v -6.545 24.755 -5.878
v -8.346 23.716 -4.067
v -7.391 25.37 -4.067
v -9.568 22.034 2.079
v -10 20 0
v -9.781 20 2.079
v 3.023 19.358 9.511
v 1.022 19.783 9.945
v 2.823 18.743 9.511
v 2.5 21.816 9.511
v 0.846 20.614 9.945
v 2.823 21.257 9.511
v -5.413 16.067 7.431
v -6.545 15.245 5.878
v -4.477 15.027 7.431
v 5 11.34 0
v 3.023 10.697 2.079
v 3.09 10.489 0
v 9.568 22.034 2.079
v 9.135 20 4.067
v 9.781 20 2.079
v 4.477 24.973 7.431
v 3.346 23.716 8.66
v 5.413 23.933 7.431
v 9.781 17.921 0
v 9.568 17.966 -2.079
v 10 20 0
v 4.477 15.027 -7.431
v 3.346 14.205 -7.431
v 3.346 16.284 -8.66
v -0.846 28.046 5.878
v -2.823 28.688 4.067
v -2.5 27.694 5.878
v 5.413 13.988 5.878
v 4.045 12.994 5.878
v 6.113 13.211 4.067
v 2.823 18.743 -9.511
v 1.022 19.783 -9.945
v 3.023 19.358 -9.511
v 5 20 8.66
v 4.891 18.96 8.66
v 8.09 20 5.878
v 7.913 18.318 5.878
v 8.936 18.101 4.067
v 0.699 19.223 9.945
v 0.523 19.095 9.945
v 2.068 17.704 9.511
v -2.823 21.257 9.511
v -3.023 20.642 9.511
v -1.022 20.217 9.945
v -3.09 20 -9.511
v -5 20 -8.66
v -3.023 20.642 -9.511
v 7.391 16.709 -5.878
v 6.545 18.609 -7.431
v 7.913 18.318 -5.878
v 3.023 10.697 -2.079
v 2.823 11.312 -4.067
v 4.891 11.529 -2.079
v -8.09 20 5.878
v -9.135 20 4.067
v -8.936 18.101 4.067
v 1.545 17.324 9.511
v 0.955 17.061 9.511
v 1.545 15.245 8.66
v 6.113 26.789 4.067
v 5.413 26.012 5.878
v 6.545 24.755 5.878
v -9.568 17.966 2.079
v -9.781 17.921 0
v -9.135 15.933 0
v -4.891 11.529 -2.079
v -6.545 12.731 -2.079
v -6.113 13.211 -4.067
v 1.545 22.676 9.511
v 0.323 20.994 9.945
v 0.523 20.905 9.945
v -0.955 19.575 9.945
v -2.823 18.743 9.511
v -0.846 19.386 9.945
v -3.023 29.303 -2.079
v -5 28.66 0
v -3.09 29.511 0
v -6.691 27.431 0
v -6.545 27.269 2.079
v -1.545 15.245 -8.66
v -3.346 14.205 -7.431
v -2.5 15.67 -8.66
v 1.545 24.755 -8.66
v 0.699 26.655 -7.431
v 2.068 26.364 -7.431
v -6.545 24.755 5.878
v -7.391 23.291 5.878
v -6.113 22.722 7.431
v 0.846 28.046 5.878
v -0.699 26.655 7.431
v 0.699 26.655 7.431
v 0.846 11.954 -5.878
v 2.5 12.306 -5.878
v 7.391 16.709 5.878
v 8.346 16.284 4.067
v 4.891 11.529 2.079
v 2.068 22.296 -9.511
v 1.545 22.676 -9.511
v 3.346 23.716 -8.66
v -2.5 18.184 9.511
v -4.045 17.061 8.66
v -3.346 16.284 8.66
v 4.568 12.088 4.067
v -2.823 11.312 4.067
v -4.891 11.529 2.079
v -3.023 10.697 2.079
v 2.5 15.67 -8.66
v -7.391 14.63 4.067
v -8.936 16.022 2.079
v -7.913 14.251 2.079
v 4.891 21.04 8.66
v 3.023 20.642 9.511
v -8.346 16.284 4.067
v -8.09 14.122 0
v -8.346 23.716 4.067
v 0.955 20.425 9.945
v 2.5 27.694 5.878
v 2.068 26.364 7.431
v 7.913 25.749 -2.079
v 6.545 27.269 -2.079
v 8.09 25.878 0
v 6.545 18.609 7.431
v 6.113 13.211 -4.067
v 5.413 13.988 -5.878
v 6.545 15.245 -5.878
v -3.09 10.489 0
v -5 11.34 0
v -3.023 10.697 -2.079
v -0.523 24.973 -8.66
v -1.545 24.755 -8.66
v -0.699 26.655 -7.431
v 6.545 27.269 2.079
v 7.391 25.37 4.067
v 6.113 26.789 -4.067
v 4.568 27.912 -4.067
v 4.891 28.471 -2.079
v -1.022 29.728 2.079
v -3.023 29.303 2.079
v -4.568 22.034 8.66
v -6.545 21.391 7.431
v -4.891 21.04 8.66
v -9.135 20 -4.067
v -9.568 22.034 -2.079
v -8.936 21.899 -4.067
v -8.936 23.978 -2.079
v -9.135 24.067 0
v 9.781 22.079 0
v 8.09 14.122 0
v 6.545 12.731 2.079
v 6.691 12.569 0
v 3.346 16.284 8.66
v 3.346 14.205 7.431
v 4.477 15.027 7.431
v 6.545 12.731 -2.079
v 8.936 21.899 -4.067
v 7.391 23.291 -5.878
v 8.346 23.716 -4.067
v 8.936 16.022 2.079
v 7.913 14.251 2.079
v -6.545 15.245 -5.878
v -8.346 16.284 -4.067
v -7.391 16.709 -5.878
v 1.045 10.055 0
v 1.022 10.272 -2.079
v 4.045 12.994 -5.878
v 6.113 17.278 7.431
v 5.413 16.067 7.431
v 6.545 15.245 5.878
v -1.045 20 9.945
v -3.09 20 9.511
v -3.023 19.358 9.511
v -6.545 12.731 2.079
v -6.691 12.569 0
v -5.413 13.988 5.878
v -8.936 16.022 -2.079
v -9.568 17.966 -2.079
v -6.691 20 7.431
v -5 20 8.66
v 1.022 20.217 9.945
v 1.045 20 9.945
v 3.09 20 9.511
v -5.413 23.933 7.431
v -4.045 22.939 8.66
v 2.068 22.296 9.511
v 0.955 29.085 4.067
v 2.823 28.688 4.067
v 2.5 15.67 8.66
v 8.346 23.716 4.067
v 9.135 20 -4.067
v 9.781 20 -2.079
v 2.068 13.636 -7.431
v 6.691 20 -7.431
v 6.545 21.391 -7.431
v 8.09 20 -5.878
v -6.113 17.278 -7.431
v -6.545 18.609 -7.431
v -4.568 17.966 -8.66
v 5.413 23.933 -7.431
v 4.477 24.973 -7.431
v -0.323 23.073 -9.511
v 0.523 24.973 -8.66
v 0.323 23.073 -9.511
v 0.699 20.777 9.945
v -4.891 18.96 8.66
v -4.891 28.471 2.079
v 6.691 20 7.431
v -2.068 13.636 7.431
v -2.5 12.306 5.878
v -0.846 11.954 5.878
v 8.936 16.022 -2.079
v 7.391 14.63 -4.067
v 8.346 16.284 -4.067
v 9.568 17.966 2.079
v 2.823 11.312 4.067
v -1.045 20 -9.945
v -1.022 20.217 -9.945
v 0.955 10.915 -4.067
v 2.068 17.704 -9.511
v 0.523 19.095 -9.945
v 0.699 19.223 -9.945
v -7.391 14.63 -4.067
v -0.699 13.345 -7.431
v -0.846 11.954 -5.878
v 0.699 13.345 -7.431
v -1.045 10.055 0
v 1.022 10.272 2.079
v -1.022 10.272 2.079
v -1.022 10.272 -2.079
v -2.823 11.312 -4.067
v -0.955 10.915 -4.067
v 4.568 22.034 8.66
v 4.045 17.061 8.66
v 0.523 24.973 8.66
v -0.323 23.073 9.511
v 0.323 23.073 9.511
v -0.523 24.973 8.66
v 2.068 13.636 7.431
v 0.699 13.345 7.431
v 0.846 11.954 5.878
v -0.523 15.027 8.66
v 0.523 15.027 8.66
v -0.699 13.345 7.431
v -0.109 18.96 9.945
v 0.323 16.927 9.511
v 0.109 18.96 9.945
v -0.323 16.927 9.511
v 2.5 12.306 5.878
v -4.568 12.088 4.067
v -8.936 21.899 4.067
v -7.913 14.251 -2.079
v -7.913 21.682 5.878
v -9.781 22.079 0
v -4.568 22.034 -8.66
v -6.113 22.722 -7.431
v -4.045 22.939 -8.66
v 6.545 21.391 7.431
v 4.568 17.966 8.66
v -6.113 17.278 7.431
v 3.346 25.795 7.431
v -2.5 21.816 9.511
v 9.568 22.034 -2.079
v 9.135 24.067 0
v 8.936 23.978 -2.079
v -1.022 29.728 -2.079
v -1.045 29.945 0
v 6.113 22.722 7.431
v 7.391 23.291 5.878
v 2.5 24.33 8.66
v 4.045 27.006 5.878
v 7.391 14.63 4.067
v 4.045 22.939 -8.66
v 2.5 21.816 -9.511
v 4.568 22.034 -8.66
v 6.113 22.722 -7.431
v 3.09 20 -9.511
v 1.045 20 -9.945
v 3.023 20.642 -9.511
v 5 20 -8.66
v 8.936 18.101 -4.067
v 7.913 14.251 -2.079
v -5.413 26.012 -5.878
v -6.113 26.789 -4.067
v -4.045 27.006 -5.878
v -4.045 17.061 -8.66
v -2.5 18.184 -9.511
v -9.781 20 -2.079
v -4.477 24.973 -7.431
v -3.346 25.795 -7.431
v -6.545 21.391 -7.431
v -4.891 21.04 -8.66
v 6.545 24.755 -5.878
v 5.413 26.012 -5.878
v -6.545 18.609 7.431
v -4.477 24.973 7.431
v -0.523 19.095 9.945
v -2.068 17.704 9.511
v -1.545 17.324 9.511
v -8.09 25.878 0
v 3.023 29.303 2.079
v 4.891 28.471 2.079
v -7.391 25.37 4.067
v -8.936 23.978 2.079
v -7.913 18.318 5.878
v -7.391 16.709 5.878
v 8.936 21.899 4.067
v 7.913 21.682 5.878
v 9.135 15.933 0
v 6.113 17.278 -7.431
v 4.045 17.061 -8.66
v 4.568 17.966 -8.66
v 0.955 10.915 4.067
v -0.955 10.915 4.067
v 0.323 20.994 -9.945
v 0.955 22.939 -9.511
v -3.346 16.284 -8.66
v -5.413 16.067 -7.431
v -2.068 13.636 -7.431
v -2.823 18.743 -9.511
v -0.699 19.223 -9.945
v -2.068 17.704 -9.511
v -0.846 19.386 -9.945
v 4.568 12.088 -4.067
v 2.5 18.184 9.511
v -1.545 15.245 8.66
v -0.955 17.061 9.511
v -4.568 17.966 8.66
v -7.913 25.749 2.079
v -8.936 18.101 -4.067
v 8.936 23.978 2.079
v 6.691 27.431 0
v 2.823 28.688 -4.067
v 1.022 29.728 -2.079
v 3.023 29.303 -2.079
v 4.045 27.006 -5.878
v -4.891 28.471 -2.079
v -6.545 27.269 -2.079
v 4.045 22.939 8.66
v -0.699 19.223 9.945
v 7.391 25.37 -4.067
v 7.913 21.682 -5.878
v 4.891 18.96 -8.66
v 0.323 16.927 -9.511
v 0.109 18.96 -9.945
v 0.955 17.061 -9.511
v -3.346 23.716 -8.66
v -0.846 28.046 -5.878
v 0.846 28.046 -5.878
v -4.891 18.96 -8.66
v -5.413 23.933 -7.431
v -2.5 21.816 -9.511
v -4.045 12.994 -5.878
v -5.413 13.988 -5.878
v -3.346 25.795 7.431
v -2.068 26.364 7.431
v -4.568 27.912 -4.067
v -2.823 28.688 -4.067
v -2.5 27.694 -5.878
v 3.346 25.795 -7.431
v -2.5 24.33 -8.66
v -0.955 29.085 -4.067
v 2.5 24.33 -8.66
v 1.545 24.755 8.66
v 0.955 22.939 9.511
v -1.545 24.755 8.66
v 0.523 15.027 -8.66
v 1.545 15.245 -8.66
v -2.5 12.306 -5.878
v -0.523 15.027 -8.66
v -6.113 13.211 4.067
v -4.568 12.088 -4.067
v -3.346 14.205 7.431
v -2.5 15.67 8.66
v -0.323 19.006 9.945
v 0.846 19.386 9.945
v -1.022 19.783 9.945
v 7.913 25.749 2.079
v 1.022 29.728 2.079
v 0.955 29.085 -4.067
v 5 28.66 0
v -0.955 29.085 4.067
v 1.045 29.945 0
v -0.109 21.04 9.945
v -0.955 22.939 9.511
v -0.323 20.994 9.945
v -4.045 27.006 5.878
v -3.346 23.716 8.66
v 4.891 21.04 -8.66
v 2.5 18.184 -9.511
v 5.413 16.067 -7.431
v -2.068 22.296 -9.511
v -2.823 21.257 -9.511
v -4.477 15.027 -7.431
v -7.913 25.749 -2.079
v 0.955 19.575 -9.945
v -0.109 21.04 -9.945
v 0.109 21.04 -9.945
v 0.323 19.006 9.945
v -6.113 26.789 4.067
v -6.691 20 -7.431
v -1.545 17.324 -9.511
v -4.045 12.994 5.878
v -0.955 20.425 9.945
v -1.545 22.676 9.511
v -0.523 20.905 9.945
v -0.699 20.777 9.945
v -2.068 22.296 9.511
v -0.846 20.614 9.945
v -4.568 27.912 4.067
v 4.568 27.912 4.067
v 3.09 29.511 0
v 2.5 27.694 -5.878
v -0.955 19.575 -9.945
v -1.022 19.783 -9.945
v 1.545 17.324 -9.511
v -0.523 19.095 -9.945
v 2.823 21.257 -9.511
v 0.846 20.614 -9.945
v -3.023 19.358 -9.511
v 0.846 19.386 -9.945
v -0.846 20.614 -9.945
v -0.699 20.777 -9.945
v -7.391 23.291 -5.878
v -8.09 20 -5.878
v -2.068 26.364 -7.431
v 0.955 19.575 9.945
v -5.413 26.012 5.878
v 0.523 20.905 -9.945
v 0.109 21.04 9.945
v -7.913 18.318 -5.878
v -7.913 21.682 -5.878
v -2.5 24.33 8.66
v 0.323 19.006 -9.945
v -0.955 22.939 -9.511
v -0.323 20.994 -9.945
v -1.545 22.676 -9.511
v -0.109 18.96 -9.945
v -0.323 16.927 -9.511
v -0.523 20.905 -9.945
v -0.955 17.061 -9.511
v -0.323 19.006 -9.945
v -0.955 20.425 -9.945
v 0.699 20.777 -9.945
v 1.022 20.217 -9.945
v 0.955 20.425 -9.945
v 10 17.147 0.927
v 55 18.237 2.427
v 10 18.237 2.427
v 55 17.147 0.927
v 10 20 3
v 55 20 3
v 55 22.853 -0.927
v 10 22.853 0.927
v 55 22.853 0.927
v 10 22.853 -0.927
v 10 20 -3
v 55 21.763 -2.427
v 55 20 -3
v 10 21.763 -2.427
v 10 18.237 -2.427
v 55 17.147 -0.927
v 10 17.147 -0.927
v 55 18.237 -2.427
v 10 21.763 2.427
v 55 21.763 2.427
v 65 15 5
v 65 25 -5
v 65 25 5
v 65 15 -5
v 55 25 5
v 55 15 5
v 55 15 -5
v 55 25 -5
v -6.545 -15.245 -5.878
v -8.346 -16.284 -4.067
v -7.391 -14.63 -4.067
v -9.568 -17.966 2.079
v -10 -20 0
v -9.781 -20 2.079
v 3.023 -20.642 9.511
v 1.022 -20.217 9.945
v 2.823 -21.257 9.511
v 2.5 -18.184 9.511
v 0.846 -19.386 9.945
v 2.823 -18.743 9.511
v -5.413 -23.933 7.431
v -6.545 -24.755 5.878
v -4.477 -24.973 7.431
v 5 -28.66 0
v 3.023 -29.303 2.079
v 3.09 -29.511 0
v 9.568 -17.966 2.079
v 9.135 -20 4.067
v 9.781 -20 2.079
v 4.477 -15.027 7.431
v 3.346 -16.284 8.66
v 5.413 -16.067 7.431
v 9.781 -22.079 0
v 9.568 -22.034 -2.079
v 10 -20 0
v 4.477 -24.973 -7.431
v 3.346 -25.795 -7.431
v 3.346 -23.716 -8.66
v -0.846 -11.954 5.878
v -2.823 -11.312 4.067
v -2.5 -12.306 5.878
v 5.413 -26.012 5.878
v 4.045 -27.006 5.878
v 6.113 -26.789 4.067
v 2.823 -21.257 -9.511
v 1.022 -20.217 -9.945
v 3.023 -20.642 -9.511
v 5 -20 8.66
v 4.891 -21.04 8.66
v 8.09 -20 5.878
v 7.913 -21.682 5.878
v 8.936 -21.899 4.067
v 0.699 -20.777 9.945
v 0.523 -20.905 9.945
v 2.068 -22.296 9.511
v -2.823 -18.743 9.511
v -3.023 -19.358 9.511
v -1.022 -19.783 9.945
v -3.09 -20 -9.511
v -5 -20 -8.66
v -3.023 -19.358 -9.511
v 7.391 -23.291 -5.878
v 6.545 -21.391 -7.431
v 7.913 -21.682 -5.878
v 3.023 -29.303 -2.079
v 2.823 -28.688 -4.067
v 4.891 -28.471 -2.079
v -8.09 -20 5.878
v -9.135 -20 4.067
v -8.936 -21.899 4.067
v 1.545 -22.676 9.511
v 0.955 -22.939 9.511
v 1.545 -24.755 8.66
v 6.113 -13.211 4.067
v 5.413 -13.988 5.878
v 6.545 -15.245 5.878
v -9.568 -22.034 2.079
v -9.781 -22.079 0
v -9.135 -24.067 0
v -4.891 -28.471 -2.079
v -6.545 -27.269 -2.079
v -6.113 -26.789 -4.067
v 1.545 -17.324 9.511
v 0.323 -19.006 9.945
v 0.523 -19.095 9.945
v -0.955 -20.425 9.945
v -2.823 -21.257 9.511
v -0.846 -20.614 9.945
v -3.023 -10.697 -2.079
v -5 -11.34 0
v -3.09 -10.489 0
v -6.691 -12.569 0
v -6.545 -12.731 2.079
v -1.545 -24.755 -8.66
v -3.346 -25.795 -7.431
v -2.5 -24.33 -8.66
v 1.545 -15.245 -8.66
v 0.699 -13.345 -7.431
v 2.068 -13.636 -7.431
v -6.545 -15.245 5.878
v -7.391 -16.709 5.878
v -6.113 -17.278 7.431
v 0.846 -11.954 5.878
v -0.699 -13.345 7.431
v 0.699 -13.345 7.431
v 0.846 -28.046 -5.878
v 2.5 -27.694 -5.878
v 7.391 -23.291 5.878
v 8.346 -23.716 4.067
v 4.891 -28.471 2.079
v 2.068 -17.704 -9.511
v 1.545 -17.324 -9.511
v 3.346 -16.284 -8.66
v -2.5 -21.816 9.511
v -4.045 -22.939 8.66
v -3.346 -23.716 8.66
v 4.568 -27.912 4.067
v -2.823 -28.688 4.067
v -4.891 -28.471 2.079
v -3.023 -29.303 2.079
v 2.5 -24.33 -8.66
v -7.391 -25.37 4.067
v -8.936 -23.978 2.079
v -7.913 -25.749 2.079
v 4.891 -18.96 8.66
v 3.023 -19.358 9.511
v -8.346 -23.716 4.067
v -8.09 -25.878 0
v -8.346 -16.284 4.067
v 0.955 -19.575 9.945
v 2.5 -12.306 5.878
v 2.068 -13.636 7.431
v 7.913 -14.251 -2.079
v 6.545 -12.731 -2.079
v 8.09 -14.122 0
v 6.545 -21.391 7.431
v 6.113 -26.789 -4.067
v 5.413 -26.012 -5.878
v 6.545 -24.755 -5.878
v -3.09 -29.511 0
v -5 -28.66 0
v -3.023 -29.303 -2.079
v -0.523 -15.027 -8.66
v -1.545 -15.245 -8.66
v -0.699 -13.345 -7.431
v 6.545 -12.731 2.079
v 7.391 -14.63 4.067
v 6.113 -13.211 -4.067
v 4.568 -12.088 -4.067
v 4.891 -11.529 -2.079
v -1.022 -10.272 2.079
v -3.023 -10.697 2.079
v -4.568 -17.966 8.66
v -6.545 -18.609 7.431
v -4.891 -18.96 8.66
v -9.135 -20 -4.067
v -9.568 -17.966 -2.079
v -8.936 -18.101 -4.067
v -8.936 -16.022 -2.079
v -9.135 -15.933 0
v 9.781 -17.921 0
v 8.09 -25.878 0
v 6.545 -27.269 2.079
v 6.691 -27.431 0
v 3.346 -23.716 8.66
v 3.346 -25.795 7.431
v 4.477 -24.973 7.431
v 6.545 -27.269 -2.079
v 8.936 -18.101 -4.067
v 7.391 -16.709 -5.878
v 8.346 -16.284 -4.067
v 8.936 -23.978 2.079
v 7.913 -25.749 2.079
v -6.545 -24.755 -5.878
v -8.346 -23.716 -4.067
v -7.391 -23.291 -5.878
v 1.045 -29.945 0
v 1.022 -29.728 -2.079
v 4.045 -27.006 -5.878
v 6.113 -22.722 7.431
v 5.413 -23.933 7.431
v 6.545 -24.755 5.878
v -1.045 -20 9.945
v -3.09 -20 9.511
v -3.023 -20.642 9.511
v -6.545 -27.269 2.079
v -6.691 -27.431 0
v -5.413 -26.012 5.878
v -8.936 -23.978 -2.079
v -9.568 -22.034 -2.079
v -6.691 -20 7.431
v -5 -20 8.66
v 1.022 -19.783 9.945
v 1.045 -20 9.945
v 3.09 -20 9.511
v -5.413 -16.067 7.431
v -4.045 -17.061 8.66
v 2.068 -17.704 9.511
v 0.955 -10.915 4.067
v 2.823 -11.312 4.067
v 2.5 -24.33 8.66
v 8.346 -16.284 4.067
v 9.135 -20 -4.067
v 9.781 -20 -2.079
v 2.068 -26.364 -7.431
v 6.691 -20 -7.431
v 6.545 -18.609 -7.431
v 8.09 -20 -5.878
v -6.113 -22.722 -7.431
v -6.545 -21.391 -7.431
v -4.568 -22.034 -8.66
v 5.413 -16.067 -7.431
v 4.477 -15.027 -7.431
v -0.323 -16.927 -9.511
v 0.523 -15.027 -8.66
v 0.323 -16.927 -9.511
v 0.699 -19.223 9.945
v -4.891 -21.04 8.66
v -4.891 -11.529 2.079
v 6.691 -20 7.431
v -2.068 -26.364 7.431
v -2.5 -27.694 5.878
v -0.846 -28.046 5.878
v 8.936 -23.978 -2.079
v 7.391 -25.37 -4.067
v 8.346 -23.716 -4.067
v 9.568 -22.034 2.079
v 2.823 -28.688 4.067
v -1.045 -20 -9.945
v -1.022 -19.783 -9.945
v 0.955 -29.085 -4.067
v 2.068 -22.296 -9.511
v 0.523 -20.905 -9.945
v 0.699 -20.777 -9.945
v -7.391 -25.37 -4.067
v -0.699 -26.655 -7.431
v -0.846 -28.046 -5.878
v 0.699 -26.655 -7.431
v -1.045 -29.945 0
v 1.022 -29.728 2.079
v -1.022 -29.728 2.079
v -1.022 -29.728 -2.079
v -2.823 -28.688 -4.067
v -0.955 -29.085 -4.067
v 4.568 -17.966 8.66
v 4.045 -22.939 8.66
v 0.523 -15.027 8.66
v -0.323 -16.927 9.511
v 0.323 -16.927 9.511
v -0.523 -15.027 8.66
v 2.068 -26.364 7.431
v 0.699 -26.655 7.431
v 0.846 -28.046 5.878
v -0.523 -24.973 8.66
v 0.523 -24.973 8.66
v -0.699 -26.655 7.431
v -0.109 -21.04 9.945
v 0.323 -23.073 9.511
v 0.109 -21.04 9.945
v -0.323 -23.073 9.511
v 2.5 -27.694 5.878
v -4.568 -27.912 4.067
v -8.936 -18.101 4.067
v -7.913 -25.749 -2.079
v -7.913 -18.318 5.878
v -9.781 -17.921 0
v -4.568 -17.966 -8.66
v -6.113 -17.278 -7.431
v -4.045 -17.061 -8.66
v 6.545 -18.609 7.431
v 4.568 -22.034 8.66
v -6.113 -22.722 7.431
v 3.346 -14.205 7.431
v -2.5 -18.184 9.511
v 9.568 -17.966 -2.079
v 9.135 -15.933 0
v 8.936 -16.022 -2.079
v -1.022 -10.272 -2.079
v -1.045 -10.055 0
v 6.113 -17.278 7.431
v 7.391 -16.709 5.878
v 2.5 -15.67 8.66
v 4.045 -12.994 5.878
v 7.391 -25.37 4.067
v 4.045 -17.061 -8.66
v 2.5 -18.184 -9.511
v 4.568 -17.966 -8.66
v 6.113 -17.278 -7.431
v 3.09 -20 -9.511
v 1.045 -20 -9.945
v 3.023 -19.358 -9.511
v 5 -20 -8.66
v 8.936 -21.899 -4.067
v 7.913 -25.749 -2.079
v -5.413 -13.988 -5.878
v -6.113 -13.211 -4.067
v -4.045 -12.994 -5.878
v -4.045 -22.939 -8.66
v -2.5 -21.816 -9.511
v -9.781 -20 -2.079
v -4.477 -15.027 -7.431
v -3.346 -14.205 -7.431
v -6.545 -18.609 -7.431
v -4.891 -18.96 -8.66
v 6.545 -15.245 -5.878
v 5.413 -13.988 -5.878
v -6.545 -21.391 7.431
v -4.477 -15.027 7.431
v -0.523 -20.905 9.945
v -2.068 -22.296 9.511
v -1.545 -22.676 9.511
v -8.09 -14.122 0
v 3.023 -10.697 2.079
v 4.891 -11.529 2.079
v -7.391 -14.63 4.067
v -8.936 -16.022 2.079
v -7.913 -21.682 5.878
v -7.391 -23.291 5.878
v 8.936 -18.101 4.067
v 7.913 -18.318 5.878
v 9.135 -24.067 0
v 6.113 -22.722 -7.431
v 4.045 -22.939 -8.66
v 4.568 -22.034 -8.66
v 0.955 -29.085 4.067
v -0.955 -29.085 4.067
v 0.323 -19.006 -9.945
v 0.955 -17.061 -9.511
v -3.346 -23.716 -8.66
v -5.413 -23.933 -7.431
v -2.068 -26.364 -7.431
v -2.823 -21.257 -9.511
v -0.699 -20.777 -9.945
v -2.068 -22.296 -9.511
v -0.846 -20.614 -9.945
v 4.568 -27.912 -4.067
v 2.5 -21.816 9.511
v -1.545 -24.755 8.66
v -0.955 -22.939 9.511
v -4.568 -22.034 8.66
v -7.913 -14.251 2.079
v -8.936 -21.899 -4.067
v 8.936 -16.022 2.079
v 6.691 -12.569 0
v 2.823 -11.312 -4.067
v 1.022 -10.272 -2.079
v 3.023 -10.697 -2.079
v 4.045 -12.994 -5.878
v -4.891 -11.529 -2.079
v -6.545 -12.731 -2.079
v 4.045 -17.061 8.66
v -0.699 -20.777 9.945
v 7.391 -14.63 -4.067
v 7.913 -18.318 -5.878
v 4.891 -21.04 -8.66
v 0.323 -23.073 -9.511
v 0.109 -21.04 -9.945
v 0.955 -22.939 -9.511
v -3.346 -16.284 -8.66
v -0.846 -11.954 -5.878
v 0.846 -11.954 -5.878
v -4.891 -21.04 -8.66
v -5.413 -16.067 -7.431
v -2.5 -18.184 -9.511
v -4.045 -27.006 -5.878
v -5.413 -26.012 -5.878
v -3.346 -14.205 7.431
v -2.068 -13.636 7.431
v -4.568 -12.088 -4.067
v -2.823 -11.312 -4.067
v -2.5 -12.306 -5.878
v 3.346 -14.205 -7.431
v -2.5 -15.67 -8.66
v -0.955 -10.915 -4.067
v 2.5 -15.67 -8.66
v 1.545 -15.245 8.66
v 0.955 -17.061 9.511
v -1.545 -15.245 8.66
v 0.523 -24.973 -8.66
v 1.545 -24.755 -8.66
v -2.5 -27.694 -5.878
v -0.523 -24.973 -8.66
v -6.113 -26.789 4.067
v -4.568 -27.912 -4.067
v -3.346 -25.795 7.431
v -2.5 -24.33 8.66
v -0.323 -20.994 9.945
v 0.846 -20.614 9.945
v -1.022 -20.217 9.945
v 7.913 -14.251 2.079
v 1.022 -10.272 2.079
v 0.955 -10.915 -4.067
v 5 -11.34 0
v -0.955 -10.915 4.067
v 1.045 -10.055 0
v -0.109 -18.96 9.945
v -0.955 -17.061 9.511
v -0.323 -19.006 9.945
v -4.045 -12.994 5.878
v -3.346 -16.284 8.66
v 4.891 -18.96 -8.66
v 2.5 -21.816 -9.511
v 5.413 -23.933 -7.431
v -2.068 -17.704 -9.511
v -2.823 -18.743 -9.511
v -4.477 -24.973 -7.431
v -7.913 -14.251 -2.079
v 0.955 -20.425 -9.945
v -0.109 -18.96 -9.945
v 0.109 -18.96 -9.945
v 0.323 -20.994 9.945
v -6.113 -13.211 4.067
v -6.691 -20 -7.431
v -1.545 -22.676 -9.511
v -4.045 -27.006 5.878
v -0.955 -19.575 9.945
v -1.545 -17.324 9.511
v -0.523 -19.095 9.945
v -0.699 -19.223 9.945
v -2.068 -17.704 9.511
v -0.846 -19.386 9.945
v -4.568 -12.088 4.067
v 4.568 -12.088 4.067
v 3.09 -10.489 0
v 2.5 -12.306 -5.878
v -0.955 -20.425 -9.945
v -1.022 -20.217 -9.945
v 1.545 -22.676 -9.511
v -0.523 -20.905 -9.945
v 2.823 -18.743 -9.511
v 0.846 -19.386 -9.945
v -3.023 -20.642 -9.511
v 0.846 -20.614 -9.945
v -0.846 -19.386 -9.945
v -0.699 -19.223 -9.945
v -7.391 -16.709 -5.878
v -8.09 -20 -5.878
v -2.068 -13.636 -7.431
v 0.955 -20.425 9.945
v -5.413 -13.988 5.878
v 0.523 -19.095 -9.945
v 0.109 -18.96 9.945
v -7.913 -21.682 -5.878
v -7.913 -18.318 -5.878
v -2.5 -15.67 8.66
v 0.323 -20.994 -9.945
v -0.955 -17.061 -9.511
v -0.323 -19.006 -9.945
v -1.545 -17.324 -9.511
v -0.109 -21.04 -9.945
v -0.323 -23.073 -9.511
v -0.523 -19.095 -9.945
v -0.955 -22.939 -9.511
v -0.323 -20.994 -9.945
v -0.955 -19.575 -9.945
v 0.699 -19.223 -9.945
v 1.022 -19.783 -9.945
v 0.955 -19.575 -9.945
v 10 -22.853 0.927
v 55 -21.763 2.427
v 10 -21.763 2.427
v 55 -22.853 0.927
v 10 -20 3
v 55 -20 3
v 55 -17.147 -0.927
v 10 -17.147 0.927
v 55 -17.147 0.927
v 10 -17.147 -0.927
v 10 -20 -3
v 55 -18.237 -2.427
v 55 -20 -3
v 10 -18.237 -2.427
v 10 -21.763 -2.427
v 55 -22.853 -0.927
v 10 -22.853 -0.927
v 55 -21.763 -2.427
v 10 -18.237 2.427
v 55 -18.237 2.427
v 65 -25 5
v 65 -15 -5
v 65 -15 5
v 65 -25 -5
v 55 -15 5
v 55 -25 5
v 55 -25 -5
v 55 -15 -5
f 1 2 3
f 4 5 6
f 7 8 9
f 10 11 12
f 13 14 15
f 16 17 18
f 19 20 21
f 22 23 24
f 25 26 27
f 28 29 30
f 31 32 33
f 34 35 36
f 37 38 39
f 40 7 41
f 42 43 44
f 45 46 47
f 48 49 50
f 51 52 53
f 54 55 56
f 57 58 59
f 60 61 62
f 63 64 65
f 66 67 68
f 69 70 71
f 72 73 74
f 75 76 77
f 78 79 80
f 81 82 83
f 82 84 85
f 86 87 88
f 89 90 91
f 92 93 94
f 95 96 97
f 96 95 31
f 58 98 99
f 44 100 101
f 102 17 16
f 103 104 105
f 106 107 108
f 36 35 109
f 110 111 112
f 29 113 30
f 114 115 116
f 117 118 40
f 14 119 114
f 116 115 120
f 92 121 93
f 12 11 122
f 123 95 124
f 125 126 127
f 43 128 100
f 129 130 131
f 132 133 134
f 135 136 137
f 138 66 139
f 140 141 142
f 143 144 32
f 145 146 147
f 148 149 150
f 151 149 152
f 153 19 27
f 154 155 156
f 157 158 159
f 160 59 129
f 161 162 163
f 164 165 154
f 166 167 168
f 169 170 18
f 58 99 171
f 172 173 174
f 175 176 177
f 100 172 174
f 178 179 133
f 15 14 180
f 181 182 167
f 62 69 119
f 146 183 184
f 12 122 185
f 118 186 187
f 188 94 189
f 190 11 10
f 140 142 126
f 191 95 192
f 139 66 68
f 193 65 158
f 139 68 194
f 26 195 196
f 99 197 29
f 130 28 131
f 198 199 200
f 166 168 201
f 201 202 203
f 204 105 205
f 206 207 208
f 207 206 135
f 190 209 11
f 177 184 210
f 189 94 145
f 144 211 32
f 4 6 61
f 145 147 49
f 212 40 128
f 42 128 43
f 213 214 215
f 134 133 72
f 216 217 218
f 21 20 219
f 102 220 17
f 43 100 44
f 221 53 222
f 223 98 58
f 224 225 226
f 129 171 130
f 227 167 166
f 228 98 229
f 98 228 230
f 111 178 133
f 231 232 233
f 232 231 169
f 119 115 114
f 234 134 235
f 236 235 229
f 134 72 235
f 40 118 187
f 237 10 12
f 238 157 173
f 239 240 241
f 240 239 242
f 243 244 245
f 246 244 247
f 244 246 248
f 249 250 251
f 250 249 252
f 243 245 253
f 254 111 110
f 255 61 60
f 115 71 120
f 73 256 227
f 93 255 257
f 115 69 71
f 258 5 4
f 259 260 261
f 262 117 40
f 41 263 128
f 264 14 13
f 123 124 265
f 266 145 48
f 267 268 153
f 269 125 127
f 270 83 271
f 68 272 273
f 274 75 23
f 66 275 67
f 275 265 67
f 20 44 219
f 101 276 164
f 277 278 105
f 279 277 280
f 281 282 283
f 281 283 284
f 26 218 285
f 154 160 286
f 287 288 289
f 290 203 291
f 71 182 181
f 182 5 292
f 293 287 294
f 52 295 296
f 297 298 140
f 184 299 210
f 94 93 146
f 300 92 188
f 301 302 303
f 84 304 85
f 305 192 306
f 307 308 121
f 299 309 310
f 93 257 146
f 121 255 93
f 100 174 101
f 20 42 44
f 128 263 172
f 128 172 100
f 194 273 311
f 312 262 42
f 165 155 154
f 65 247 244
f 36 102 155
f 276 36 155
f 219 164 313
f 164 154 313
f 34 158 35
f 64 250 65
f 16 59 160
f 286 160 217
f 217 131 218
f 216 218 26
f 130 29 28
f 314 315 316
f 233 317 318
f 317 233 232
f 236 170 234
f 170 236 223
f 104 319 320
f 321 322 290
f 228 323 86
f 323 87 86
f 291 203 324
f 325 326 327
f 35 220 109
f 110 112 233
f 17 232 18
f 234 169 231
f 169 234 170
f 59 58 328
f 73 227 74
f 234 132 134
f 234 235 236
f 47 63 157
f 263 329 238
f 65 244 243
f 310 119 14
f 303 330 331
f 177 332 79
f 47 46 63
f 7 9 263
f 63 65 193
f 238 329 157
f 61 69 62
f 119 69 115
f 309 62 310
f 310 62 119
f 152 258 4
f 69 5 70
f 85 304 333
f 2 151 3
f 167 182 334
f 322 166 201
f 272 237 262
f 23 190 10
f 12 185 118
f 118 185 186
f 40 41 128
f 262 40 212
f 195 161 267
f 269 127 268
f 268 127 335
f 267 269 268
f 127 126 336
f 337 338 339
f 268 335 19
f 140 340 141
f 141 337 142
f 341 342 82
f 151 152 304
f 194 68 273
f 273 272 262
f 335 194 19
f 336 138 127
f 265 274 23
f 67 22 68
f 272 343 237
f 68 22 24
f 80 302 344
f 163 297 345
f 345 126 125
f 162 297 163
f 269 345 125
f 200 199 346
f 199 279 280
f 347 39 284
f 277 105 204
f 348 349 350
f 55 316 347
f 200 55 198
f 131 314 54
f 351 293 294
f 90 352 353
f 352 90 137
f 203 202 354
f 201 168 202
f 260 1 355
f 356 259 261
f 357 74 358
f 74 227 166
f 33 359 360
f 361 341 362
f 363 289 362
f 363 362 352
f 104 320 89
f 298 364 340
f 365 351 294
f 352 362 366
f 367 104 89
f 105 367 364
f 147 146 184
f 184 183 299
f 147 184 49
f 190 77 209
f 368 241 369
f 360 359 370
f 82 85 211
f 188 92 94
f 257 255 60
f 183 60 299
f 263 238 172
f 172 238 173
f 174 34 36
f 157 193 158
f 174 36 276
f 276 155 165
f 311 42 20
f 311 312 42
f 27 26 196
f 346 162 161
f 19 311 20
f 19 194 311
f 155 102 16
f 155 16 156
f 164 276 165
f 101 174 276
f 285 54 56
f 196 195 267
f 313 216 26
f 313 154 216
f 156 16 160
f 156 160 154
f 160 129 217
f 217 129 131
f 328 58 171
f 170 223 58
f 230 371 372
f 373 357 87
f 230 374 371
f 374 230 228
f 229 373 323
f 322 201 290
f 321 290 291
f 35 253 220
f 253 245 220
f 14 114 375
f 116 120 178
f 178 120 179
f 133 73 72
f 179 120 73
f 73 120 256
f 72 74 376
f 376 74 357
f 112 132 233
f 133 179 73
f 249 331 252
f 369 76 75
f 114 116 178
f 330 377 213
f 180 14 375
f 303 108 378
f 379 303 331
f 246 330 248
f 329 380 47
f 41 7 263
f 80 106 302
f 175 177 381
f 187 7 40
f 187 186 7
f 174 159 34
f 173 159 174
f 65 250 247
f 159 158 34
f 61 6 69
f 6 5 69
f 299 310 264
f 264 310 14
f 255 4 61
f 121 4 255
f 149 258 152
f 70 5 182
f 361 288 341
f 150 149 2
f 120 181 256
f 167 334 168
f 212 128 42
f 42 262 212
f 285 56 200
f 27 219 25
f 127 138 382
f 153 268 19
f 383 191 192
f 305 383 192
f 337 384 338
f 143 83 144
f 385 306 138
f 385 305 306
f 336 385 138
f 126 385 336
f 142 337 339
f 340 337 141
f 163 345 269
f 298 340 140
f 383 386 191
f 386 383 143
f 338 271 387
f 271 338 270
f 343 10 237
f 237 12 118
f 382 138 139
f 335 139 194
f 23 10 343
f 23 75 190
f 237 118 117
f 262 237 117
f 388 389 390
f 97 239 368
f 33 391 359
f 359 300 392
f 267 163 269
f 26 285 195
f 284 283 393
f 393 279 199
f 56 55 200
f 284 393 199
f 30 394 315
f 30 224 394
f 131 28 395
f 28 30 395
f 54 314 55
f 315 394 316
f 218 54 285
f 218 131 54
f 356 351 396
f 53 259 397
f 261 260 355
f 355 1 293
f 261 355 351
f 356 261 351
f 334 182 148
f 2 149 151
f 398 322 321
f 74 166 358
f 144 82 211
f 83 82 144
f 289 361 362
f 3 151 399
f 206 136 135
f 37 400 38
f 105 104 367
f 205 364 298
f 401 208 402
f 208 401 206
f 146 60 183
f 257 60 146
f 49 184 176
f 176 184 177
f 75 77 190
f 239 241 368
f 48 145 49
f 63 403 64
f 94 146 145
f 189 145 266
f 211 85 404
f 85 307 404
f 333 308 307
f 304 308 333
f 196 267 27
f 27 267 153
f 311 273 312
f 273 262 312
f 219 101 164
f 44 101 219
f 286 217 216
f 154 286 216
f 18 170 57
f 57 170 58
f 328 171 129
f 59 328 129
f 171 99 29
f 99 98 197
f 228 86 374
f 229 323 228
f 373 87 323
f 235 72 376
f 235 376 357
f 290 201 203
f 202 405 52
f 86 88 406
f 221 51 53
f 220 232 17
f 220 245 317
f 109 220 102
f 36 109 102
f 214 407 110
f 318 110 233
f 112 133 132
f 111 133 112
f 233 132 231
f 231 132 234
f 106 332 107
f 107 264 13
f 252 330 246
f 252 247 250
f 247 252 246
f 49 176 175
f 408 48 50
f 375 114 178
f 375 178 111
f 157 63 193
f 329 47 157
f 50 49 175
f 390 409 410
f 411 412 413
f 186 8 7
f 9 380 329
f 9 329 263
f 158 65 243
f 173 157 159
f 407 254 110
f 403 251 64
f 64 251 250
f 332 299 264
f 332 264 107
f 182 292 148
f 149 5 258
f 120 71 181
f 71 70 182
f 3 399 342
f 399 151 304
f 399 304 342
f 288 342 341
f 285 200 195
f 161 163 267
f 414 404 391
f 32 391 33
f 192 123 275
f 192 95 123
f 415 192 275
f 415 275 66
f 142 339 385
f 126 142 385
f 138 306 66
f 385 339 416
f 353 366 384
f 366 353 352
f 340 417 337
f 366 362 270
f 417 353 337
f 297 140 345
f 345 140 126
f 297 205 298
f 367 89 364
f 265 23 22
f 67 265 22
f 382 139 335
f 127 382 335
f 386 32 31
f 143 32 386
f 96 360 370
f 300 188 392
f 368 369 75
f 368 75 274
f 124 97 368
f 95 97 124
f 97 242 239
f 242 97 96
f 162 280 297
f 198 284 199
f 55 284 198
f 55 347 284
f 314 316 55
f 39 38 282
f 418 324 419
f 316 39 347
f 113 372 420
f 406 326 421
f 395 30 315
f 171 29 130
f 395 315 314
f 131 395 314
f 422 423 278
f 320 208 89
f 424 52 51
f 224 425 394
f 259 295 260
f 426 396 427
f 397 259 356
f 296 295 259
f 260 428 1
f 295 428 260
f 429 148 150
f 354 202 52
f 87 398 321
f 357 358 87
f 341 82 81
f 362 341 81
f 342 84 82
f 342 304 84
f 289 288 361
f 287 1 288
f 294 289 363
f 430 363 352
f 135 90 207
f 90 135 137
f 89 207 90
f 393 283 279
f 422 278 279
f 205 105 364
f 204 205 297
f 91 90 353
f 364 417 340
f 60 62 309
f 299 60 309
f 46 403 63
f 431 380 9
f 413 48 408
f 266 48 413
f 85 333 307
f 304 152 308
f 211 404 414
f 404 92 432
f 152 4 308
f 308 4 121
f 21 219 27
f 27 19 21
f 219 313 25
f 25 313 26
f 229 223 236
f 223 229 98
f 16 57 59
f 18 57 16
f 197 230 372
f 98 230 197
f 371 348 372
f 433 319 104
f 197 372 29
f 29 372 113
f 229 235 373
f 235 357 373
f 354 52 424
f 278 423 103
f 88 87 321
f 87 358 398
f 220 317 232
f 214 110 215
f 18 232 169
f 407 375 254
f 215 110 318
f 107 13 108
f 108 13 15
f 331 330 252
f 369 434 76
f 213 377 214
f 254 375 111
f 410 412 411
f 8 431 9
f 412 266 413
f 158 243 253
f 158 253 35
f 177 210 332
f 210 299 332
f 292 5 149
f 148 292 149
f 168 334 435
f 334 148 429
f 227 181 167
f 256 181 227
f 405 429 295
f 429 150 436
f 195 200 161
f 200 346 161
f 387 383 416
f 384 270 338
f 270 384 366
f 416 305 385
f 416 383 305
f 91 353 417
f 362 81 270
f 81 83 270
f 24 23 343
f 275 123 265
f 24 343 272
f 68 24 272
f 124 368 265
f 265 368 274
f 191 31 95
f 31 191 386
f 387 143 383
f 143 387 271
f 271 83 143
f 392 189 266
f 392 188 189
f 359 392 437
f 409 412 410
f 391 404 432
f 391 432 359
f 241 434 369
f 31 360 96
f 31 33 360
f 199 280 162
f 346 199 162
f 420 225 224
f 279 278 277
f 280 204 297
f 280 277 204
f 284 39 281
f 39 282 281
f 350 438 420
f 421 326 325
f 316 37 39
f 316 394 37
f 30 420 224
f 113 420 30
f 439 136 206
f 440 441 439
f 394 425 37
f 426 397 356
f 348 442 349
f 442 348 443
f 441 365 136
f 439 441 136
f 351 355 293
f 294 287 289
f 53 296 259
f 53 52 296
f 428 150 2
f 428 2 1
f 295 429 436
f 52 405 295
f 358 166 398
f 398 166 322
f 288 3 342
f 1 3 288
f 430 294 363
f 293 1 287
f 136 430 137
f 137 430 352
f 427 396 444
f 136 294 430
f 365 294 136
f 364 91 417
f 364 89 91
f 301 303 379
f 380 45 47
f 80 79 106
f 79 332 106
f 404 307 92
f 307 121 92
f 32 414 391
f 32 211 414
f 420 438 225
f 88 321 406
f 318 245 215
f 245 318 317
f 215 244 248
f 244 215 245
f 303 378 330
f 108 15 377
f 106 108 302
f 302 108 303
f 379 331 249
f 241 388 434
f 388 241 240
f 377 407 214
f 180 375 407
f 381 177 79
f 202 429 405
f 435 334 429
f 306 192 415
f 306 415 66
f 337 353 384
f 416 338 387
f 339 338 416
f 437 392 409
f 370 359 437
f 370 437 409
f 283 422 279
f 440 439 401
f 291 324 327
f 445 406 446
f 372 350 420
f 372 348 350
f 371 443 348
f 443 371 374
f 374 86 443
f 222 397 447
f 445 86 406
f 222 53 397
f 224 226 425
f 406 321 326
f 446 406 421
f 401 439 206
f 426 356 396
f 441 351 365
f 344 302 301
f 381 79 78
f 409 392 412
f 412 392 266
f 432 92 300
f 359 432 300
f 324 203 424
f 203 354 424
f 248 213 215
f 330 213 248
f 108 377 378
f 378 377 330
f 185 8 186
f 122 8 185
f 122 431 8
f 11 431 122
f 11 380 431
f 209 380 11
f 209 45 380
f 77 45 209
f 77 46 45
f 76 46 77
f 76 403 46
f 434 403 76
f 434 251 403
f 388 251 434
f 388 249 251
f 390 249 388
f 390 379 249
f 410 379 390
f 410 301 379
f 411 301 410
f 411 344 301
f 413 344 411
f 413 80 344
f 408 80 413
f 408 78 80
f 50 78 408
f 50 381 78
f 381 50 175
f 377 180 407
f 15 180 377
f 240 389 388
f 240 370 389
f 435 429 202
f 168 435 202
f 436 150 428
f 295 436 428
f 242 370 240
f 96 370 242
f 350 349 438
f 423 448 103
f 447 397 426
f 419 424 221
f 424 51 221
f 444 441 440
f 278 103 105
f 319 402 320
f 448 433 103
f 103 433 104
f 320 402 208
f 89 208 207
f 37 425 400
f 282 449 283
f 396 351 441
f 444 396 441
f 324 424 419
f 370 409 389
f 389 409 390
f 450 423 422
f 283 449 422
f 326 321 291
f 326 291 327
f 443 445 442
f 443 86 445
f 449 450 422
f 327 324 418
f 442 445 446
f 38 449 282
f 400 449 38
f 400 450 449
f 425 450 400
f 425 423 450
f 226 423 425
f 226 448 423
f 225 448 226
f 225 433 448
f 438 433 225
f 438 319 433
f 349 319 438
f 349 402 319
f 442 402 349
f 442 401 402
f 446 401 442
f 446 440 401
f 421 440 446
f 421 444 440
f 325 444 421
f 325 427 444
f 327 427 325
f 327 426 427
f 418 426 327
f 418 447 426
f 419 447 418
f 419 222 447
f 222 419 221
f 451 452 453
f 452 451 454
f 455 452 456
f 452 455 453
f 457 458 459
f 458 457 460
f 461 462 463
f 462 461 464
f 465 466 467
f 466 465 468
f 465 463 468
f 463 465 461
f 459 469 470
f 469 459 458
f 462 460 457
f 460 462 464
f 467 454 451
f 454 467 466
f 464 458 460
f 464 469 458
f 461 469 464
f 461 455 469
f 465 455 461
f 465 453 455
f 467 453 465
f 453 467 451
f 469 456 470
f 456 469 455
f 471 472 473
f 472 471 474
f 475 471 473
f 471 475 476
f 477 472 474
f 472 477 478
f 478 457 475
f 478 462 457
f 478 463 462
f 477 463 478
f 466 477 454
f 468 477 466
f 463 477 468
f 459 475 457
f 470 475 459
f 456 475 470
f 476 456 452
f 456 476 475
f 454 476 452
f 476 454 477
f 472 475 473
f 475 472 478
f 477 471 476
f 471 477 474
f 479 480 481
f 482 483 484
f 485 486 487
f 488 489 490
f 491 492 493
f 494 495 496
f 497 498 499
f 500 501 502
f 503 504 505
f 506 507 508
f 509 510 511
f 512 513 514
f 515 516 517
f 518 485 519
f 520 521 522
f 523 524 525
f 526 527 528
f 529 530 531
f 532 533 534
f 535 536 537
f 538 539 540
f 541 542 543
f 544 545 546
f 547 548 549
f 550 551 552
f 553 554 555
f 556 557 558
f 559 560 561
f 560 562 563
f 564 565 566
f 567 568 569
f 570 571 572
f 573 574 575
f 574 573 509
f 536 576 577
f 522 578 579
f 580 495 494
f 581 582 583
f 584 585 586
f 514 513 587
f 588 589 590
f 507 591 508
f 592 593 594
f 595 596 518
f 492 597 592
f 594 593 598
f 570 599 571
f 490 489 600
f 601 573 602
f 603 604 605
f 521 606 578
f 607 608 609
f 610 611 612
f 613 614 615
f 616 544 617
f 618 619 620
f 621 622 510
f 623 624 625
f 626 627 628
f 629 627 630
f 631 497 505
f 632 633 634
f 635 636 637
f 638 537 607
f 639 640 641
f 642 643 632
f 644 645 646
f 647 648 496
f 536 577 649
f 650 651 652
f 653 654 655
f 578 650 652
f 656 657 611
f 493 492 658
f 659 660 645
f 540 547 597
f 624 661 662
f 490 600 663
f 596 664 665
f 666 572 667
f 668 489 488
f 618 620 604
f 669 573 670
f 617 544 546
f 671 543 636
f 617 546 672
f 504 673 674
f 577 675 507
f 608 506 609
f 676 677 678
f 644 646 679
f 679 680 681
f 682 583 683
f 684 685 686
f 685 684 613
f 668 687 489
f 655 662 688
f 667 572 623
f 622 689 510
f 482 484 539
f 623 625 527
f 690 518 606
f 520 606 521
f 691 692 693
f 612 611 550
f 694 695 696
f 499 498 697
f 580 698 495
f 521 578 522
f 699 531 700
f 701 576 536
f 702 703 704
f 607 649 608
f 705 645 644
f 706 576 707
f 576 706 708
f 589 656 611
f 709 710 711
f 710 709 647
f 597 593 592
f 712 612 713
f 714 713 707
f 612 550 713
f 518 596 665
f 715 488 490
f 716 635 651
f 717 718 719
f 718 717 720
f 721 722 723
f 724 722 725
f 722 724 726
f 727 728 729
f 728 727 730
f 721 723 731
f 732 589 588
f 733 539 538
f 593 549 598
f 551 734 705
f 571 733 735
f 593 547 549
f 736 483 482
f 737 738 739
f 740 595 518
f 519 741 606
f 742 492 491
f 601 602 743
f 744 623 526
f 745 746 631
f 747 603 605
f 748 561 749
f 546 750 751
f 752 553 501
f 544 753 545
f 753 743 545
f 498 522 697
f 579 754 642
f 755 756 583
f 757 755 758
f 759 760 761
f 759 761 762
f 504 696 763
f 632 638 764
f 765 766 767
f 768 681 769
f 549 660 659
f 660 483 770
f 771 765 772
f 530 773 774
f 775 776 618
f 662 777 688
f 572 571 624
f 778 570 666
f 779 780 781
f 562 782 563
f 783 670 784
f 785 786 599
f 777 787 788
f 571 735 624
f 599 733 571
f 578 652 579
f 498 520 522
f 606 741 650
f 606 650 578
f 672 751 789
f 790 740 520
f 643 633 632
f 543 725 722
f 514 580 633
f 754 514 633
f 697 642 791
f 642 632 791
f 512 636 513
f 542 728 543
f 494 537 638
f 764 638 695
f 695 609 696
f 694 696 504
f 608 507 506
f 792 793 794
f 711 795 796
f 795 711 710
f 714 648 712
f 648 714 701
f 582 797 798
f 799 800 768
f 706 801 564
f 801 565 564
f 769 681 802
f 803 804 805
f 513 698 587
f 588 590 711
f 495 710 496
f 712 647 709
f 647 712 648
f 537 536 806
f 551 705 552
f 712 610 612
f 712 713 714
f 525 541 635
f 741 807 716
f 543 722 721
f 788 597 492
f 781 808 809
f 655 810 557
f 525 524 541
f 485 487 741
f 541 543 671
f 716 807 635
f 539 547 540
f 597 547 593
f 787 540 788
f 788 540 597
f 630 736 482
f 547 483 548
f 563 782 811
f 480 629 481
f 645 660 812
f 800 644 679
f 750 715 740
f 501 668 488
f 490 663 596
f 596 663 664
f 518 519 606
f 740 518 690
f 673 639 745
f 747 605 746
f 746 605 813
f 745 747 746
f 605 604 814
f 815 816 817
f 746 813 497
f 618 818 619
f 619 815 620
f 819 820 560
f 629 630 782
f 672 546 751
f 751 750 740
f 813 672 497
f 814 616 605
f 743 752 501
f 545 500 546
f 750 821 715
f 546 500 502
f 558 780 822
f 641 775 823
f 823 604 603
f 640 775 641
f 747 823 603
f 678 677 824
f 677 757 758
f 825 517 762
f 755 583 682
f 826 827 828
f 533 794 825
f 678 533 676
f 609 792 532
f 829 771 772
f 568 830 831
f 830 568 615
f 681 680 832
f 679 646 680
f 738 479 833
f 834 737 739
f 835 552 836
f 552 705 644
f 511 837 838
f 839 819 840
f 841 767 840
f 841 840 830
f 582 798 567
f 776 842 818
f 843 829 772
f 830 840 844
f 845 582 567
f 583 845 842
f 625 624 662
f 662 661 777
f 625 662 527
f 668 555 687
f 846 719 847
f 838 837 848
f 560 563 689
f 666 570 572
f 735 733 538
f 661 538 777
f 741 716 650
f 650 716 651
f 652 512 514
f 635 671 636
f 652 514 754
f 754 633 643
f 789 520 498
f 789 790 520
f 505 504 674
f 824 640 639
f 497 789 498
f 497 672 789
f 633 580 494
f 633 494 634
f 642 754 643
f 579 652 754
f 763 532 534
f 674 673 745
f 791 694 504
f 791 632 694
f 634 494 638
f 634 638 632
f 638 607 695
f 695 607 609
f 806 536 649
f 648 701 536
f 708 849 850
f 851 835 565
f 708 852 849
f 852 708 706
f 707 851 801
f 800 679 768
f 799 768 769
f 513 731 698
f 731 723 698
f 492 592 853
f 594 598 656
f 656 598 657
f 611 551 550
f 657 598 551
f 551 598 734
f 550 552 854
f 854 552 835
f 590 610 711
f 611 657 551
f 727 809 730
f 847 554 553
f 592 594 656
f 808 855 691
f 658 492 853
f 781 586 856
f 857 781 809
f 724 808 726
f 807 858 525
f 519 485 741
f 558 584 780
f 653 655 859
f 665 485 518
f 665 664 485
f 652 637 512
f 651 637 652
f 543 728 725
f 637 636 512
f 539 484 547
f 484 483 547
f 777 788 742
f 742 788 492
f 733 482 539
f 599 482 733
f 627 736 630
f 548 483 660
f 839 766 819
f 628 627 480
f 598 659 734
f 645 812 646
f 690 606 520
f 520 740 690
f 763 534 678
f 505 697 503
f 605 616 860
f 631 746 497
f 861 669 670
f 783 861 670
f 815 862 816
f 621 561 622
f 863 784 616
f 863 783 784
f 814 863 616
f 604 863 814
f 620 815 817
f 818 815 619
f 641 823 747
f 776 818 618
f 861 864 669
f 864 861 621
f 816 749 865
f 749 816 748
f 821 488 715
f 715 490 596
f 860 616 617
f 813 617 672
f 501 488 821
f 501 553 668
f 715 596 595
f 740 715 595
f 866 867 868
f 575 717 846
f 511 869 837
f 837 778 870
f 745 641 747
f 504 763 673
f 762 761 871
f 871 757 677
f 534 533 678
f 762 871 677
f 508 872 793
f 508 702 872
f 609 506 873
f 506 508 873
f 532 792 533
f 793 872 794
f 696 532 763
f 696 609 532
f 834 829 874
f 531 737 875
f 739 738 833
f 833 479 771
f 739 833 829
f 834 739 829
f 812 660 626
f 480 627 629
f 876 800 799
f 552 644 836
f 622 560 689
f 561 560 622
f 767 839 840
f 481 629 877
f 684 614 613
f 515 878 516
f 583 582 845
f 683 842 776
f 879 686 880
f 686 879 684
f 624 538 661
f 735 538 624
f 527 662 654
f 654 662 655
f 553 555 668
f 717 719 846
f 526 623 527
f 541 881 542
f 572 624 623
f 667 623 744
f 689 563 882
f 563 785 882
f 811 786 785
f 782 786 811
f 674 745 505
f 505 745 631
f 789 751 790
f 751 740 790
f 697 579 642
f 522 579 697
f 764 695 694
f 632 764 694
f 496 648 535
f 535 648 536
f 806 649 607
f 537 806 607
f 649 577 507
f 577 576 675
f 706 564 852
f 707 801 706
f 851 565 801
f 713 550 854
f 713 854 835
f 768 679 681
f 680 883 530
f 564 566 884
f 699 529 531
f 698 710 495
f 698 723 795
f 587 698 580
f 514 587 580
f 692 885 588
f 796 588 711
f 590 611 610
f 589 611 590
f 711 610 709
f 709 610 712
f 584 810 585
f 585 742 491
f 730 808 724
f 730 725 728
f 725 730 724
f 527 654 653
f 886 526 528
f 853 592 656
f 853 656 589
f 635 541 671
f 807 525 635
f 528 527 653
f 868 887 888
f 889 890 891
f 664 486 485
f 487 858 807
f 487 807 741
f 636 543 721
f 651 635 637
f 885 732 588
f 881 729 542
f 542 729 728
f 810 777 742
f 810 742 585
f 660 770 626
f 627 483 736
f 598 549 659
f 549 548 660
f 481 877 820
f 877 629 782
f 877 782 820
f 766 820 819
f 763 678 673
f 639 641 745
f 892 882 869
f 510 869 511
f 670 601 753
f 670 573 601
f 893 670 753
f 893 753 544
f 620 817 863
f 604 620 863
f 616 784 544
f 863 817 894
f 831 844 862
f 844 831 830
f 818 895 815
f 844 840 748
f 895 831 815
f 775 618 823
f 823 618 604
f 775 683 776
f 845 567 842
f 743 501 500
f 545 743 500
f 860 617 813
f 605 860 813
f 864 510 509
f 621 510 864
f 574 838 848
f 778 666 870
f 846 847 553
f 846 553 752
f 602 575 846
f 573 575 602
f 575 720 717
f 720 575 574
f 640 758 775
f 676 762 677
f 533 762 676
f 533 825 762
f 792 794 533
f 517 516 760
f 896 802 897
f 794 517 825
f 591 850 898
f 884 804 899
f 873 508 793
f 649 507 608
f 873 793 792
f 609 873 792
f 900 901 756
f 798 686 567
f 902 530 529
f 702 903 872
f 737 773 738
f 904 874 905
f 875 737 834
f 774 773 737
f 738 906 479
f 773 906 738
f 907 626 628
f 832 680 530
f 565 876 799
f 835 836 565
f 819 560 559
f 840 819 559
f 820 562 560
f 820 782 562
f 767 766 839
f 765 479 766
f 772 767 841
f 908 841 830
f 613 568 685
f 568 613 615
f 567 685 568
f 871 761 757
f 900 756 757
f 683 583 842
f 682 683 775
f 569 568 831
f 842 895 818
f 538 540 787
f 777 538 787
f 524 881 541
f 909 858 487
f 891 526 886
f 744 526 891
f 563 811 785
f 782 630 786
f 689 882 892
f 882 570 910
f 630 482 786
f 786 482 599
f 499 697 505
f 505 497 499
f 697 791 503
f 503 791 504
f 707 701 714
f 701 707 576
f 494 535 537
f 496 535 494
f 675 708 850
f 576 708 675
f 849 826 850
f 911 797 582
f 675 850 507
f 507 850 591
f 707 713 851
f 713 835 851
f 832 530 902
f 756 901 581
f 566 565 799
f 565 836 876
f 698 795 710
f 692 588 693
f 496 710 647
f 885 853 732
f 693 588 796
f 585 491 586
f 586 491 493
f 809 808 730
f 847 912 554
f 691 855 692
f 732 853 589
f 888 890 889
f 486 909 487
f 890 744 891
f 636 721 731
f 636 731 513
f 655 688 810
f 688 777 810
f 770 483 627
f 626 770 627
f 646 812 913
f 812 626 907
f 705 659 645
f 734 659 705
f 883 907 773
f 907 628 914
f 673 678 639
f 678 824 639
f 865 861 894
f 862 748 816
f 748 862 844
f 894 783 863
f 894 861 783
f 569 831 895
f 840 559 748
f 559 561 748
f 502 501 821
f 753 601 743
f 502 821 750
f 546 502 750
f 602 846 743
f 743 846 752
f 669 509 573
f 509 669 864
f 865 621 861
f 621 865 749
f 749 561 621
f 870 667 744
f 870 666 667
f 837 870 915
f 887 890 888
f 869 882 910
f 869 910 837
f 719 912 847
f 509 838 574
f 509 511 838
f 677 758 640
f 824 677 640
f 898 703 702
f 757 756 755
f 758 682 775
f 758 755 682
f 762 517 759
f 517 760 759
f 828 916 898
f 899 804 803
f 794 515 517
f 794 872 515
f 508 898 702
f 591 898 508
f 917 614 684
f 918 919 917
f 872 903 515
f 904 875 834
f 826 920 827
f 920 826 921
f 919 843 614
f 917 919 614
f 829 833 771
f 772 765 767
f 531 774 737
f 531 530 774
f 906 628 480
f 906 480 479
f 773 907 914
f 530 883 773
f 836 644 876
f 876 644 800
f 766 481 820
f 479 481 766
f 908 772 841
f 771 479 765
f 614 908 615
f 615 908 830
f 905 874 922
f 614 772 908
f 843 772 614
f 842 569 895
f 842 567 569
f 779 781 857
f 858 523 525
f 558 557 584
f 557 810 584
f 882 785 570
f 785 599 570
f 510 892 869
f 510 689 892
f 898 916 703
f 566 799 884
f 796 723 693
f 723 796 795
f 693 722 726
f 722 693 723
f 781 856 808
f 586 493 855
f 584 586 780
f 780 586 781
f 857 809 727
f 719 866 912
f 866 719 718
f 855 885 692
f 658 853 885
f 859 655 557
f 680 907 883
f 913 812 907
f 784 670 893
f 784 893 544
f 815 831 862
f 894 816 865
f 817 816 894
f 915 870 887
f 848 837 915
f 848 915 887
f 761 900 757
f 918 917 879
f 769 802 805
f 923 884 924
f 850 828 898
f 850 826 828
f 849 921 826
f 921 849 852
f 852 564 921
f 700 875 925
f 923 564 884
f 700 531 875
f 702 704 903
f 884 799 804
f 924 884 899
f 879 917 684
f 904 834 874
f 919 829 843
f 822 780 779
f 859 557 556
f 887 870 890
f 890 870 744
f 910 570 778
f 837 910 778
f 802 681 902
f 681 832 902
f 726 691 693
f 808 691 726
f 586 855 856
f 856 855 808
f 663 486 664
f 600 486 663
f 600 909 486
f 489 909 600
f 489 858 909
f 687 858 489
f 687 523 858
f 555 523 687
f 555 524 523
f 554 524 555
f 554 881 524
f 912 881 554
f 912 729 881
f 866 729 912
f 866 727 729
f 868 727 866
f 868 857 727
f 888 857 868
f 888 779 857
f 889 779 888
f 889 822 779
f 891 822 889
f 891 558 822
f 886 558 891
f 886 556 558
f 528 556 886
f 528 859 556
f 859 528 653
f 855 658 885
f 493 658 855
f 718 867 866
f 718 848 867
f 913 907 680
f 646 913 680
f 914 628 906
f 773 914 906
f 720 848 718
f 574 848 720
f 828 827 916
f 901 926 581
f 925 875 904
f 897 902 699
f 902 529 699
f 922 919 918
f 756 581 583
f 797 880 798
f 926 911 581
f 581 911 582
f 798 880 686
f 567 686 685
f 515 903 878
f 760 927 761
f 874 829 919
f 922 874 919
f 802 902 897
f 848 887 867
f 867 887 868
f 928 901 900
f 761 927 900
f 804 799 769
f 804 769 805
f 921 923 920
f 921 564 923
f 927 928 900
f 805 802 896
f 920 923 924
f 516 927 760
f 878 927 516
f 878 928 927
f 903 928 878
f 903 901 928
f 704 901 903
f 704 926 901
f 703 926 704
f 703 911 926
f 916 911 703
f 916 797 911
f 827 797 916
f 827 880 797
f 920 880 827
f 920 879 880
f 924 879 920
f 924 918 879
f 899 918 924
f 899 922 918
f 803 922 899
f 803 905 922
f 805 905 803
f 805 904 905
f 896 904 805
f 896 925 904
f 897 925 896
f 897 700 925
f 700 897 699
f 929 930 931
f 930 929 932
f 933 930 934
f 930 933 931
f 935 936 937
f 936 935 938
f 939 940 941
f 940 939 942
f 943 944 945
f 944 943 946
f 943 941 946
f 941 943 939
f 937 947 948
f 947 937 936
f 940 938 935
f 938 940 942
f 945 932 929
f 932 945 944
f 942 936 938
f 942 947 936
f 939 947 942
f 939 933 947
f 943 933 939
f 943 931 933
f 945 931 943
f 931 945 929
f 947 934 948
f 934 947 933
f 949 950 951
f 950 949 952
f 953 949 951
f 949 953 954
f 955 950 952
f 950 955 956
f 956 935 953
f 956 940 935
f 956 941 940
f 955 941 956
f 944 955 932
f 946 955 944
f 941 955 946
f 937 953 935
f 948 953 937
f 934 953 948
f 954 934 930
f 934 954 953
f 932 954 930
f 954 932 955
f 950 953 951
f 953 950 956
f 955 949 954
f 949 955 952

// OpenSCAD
//Sender
translate([0, 20, 0])
SWR();

translate([0, -20, 0])
SWR();

module SWR()
{
    //Sender
    sphere(10);

    //Wire
    translate([10,0,0])
    rotate([0,90,0])
    cylinder(h = 50, r = 3);

    //Receiver
    translate([60,0,0])
    cube(10, center = true);
    
}
